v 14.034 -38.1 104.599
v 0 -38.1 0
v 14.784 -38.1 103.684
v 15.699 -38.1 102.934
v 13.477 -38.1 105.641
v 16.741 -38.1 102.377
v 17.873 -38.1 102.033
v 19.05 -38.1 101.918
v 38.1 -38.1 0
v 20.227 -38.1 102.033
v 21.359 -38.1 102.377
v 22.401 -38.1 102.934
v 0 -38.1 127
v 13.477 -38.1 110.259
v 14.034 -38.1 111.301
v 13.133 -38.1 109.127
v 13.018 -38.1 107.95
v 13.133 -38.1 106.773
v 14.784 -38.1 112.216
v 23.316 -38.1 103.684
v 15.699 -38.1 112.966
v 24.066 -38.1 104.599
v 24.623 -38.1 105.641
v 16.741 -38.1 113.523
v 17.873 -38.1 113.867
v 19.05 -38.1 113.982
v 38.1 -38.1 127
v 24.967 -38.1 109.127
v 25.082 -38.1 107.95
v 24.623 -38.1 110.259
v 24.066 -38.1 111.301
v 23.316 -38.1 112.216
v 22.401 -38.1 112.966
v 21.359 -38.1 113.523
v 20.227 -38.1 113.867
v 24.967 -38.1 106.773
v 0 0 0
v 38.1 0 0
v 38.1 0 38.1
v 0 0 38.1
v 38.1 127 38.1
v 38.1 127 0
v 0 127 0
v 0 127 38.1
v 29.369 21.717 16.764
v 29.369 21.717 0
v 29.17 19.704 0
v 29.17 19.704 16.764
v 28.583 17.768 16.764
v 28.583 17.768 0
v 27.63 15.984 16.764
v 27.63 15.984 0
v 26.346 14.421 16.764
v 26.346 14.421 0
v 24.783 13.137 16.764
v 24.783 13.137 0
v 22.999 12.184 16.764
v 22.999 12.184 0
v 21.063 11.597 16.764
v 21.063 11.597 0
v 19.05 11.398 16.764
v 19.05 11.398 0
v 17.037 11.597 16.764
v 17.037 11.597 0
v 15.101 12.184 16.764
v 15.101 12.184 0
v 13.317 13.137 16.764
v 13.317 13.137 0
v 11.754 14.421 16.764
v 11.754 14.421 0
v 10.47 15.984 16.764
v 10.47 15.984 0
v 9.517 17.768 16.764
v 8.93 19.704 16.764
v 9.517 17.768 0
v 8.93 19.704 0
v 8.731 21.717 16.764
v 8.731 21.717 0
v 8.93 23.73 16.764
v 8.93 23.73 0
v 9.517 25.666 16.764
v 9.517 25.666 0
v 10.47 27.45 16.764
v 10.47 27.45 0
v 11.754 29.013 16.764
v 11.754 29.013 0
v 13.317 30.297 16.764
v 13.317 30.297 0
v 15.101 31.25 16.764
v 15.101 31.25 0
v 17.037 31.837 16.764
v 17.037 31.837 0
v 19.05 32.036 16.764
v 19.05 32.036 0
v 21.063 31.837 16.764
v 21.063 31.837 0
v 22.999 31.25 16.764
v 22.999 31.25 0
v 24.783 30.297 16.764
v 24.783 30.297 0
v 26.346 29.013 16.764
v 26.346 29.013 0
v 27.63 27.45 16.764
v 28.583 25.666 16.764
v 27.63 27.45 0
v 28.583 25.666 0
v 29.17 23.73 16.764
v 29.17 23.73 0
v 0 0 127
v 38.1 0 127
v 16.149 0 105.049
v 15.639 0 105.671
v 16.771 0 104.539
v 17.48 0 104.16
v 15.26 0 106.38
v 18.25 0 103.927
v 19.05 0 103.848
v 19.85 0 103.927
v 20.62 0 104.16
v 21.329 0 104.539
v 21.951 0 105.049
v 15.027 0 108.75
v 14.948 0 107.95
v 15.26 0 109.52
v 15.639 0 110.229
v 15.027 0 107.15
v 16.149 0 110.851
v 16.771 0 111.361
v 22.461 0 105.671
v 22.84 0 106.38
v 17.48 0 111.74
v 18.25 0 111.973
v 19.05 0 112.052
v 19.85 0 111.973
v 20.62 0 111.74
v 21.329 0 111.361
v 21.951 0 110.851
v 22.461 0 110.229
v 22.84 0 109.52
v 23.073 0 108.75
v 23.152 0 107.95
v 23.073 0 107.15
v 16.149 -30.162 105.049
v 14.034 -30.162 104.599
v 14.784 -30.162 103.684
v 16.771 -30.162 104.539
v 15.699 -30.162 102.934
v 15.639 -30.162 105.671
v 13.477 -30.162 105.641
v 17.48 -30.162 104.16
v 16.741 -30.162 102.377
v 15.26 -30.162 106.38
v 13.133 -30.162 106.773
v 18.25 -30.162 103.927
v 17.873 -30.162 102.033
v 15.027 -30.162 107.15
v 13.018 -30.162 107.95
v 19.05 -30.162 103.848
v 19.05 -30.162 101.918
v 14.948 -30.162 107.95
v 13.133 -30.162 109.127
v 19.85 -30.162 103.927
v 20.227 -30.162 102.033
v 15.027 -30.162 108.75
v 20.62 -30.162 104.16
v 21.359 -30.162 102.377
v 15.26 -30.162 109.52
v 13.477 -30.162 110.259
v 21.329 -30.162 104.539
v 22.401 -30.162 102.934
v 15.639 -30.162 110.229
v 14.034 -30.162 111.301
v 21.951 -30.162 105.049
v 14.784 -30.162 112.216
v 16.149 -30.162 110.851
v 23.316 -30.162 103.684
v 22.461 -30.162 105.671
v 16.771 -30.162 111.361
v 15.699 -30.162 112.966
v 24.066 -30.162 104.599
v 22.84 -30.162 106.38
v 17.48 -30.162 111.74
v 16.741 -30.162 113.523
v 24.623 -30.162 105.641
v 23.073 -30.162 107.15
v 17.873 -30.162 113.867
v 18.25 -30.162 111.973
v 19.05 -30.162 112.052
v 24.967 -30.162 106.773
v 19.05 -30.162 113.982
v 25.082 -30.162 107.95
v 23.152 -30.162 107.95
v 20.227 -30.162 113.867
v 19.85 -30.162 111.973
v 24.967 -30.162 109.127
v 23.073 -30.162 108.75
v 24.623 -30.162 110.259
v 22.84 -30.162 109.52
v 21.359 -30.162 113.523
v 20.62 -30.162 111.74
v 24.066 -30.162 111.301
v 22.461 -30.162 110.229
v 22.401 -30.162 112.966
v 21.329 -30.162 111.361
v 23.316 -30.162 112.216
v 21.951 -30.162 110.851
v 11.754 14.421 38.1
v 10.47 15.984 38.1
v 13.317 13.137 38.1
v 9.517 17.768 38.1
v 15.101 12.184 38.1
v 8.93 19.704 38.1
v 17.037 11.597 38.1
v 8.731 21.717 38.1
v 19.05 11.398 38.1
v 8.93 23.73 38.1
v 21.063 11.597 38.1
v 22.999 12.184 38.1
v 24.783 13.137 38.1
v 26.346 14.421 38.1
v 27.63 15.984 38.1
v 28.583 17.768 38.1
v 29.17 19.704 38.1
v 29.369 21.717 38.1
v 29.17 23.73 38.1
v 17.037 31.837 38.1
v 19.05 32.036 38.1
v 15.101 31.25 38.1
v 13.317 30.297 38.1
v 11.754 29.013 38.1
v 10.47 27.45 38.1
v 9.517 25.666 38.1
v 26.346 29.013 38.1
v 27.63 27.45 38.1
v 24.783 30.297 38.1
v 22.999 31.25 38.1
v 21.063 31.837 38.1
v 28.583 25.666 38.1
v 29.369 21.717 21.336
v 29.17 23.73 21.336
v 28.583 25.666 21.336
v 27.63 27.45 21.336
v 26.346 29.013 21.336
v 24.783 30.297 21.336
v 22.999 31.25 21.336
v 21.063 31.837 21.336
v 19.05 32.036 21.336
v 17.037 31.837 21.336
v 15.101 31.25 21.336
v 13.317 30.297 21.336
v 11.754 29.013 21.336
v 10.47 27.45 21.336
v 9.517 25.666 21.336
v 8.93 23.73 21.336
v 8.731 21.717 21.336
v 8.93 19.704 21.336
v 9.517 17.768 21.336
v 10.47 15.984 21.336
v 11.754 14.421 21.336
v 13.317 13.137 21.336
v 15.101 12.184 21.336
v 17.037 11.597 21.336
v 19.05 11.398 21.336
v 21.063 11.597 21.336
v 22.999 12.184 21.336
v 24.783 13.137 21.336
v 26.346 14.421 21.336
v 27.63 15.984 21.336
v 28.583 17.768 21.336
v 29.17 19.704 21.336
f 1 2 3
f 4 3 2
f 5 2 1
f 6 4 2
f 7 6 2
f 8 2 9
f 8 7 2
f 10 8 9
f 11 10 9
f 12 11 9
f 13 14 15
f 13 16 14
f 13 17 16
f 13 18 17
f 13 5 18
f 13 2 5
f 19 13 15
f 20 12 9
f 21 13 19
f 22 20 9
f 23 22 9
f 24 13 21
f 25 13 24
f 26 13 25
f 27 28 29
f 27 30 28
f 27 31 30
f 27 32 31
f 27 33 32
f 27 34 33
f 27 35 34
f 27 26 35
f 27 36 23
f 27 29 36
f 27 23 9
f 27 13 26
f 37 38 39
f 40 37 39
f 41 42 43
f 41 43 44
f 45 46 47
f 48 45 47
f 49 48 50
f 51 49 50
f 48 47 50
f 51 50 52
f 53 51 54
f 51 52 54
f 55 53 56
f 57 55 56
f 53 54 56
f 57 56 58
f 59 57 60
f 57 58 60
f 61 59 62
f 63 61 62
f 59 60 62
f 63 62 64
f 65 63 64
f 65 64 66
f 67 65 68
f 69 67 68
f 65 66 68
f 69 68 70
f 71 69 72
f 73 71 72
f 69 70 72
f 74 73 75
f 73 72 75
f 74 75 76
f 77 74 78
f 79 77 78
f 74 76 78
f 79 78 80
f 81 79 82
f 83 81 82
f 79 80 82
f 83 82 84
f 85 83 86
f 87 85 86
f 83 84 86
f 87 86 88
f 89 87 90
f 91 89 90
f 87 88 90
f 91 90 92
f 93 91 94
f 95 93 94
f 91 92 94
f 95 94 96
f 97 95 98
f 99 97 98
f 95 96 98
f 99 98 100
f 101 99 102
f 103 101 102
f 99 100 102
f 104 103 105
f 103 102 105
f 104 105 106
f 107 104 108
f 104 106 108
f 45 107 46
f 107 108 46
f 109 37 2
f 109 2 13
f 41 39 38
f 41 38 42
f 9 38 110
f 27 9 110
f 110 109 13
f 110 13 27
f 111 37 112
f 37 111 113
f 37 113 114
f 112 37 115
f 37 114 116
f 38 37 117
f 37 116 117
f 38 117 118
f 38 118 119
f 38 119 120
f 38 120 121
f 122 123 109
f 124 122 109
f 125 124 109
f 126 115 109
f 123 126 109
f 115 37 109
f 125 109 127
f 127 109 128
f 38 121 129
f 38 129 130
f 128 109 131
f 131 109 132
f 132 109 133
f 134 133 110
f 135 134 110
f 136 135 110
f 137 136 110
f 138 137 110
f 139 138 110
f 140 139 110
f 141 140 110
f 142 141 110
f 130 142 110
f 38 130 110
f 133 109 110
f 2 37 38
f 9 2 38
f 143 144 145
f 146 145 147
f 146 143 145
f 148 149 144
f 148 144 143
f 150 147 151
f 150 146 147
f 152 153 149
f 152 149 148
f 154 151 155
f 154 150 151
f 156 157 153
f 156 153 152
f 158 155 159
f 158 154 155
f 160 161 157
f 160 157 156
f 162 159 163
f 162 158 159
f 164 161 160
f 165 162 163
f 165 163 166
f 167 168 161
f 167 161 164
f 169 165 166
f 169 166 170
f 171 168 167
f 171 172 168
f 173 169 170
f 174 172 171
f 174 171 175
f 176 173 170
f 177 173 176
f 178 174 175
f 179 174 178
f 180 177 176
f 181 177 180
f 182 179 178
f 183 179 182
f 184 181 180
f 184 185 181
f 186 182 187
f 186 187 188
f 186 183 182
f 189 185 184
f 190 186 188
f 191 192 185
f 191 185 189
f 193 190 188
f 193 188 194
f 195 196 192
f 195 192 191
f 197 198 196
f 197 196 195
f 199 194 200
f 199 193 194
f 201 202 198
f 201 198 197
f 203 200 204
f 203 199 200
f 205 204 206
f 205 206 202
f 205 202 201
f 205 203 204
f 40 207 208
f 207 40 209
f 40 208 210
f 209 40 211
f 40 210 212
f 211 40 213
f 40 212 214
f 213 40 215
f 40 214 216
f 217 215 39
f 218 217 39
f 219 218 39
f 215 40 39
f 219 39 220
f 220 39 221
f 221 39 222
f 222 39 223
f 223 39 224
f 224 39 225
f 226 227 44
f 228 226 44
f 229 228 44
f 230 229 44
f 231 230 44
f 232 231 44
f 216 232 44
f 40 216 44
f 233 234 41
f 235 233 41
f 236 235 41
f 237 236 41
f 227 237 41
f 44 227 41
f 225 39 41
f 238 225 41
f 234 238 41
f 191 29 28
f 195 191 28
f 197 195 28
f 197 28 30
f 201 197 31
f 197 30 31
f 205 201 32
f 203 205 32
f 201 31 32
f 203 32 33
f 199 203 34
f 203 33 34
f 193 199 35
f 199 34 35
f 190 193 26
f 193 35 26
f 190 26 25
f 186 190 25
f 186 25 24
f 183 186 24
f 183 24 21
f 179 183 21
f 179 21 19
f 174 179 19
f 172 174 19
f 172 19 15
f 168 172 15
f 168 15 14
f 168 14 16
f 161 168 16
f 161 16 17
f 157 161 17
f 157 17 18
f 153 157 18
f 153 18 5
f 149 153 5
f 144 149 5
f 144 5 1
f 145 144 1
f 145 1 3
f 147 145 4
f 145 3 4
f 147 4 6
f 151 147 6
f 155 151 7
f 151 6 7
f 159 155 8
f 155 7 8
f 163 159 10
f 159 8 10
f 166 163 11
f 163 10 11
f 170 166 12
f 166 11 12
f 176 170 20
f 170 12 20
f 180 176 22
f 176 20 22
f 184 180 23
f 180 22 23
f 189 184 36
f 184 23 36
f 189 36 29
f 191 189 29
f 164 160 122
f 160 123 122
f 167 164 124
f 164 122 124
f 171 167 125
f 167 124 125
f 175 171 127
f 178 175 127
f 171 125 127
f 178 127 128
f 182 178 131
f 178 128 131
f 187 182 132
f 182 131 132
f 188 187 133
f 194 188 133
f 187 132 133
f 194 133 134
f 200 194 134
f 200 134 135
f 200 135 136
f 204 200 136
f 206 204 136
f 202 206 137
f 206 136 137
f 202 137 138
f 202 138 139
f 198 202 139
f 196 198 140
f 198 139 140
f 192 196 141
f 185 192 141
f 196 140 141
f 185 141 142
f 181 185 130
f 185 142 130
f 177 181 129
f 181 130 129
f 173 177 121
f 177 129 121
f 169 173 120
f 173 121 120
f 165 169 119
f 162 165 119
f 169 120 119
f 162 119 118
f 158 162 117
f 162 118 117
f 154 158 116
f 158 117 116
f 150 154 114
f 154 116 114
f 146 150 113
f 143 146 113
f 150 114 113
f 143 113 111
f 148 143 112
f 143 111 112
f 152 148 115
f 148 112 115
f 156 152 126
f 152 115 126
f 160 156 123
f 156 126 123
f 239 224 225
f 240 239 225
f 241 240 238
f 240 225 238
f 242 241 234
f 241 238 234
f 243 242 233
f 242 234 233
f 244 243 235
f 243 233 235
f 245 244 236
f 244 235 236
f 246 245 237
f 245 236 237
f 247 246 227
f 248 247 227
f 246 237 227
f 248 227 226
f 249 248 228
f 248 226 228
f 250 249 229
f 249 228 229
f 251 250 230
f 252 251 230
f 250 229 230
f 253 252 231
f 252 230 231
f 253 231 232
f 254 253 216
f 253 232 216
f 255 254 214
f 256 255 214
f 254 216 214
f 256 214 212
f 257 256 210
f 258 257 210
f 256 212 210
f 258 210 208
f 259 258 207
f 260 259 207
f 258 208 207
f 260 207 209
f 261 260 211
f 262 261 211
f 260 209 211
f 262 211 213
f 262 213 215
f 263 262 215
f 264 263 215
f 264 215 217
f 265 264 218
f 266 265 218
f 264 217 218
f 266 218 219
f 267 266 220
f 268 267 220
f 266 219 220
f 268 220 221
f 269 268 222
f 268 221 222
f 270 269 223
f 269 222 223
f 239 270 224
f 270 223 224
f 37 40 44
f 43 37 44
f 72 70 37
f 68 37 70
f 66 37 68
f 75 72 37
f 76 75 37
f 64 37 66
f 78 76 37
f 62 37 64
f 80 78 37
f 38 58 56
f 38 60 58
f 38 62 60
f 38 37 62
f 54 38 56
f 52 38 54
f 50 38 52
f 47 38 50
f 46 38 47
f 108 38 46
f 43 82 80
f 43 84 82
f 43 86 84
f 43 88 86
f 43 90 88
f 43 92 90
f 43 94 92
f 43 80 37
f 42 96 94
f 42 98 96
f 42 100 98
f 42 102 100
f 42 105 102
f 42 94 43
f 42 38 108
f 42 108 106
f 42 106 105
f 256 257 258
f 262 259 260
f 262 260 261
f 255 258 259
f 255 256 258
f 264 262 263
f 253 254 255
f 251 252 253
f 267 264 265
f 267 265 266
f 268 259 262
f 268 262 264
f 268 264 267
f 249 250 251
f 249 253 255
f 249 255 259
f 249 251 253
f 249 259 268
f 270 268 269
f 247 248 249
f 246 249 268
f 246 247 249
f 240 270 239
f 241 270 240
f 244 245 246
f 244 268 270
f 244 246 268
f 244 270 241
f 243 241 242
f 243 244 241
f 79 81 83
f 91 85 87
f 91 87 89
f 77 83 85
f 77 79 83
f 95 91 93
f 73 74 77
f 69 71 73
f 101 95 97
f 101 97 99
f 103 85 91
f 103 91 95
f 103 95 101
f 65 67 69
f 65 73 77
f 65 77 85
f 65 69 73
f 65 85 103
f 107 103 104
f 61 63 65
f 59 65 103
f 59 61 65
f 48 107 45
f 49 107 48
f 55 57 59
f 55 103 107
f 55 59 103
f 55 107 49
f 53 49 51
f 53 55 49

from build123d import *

# Parameters (mm, degrees)
F0_W           = 38.1
F0_H           = 127
F1_DEPTH       = 38.1
F2_W           = 127
F2_H           = 38.1
F3_DEPTH       = 38.1
F5_D           = 8.2042
F5_CBORE_D     = 12.065
F5_CBORE_DEPTH = 7.9375
F6_R           = 10.31875
F7_DEPTH       = 16.764
F8_R           = 10.31875
F9_DEPTH       = 16.764


with BuildPart() as f1:
    # F0 (on Front) → F1 (new body)
    with BuildSketch(Plane.XZ):
        with Locations((19.05, 63.5)):
            Rectangle(F0_W, F0_H)
    extrude(amount=F1_DEPTH)

    # F5 (through all)
    with Locations(Plane.XZ.offset(38.1)):
        with Locations((19.05, 107.95)):
            CounterBoreHole(F5_D / 2, F5_CBORE_D / 2, F5_CBORE_DEPTH)


with BuildPart() as f3:
    # F2 (on face) → F3 (new body)
    with BuildSketch(Plane.YZ.offset(38.1)):
        with Locations((63.5, 19.05)):
            Rectangle(F2_W, F2_H)
    extrude(amount=-F3_DEPTH)

    # F6 (on face) → F7 (cut)
    with BuildSketch(Plane.XY.offset(38.1)):
        with Locations((19.05, 21.717)):
            Circle(F6_R)
    extrude(amount=-F7_DEPTH, mode=Mode.SUBTRACT)

    # F8 (on face) → F9 (cut)
    with BuildSketch(Plane(origin=(0, 0, 0), x_dir=(1, 0, 0), z_dir=(0, 0, -1))):
        with Locations((19.05, -21.717)):
            Circle(F8_R)
    extrude(amount=-F9_DEPTH, mode=Mode.SUBTRACT)


solid = Compound([f1.part, f3.part])
